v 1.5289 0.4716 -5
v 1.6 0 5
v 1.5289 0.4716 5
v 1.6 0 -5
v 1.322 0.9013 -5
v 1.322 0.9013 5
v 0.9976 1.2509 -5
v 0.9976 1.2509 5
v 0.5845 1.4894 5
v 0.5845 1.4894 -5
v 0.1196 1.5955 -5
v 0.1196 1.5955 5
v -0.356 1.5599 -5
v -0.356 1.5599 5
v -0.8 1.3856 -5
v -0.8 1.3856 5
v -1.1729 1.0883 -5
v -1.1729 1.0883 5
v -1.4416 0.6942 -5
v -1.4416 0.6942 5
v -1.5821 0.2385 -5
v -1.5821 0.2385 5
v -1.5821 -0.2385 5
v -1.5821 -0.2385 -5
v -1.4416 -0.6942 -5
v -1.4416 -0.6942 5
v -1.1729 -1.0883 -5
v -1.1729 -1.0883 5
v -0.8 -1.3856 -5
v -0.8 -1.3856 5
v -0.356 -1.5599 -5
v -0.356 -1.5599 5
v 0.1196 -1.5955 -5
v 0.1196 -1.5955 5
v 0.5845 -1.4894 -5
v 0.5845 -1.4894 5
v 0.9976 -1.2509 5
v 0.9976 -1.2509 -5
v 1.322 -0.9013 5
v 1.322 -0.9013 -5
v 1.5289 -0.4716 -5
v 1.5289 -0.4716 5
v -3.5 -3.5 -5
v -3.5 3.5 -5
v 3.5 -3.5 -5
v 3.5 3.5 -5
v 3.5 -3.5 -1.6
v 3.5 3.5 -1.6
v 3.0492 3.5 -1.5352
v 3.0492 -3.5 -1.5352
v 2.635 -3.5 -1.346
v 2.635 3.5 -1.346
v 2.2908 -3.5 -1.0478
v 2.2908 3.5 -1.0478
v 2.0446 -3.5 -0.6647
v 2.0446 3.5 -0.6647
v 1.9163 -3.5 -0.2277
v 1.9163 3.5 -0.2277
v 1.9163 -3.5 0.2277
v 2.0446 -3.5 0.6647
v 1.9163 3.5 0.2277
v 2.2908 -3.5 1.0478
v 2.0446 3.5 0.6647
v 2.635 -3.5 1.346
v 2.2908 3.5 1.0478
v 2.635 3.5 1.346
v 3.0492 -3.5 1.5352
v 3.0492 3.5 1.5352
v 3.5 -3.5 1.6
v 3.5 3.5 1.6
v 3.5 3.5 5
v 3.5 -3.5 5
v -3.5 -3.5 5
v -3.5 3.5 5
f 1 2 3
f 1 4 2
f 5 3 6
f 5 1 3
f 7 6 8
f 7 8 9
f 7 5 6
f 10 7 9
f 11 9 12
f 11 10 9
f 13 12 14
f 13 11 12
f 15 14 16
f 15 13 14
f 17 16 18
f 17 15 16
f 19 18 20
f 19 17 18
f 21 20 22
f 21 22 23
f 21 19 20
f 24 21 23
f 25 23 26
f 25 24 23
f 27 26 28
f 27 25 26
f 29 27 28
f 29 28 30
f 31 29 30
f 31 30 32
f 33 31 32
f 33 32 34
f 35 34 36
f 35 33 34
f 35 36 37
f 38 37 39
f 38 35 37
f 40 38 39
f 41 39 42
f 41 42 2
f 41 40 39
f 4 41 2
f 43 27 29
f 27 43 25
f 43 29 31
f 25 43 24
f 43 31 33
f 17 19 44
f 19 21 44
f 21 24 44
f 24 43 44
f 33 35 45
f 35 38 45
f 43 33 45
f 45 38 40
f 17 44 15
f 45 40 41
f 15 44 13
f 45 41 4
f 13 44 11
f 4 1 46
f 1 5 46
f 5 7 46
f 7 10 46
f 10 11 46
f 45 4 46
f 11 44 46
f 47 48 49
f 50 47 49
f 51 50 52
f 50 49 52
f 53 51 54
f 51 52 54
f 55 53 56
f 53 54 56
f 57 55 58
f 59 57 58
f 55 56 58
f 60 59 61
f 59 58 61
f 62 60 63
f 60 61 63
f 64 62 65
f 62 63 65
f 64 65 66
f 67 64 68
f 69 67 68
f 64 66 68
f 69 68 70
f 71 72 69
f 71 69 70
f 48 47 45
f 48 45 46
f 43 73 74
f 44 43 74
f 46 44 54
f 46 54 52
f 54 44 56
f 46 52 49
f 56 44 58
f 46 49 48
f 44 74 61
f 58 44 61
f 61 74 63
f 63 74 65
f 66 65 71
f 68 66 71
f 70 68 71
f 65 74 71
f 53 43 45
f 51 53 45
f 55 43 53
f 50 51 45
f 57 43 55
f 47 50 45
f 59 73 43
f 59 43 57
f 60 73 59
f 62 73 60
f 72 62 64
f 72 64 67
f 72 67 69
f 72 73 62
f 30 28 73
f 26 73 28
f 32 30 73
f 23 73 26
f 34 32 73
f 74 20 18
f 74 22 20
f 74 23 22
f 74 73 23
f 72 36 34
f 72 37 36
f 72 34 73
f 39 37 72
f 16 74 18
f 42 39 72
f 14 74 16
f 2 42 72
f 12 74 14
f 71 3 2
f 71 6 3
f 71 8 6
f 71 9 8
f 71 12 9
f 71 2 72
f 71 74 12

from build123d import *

# Parameters (mm, degrees)
SKETCH1_W           = 7
SKETCH1_H           = 7
SKETCH1_R           = 1.6
BOSS_EXTRUDE1_DEPTH = 5
SKETCH2_R           = 1.6
CUT_EXTRUDE1_DEPTH  = 10.287087811


with BuildPart() as part:
    # Sketch1 → Boss-Extrude1 (new, symmetric)
    with BuildSketch(Plane.XY):
        Rectangle(SKETCH1_W, SKETCH1_H)
        Circle(SKETCH1_R, mode=Mode.SUBTRACT)
    extrude(amount=BOSS_EXTRUDE1_DEPTH, both=True)

    # Sketch2 → Cut-Extrude1 (cut, through all)
    with BuildSketch(Plane(origin=(0, 3.5, 0), x_dir=(1, 0, 0), z_dir=(0, 1, 0))):
        with Locations((3.5, 0)):
            Circle(SKETCH2_R)
    extrude(amount=-CUT_EXTRUDE1_DEPTH, mode=Mode.SUBTRACT)


solid = part.part
